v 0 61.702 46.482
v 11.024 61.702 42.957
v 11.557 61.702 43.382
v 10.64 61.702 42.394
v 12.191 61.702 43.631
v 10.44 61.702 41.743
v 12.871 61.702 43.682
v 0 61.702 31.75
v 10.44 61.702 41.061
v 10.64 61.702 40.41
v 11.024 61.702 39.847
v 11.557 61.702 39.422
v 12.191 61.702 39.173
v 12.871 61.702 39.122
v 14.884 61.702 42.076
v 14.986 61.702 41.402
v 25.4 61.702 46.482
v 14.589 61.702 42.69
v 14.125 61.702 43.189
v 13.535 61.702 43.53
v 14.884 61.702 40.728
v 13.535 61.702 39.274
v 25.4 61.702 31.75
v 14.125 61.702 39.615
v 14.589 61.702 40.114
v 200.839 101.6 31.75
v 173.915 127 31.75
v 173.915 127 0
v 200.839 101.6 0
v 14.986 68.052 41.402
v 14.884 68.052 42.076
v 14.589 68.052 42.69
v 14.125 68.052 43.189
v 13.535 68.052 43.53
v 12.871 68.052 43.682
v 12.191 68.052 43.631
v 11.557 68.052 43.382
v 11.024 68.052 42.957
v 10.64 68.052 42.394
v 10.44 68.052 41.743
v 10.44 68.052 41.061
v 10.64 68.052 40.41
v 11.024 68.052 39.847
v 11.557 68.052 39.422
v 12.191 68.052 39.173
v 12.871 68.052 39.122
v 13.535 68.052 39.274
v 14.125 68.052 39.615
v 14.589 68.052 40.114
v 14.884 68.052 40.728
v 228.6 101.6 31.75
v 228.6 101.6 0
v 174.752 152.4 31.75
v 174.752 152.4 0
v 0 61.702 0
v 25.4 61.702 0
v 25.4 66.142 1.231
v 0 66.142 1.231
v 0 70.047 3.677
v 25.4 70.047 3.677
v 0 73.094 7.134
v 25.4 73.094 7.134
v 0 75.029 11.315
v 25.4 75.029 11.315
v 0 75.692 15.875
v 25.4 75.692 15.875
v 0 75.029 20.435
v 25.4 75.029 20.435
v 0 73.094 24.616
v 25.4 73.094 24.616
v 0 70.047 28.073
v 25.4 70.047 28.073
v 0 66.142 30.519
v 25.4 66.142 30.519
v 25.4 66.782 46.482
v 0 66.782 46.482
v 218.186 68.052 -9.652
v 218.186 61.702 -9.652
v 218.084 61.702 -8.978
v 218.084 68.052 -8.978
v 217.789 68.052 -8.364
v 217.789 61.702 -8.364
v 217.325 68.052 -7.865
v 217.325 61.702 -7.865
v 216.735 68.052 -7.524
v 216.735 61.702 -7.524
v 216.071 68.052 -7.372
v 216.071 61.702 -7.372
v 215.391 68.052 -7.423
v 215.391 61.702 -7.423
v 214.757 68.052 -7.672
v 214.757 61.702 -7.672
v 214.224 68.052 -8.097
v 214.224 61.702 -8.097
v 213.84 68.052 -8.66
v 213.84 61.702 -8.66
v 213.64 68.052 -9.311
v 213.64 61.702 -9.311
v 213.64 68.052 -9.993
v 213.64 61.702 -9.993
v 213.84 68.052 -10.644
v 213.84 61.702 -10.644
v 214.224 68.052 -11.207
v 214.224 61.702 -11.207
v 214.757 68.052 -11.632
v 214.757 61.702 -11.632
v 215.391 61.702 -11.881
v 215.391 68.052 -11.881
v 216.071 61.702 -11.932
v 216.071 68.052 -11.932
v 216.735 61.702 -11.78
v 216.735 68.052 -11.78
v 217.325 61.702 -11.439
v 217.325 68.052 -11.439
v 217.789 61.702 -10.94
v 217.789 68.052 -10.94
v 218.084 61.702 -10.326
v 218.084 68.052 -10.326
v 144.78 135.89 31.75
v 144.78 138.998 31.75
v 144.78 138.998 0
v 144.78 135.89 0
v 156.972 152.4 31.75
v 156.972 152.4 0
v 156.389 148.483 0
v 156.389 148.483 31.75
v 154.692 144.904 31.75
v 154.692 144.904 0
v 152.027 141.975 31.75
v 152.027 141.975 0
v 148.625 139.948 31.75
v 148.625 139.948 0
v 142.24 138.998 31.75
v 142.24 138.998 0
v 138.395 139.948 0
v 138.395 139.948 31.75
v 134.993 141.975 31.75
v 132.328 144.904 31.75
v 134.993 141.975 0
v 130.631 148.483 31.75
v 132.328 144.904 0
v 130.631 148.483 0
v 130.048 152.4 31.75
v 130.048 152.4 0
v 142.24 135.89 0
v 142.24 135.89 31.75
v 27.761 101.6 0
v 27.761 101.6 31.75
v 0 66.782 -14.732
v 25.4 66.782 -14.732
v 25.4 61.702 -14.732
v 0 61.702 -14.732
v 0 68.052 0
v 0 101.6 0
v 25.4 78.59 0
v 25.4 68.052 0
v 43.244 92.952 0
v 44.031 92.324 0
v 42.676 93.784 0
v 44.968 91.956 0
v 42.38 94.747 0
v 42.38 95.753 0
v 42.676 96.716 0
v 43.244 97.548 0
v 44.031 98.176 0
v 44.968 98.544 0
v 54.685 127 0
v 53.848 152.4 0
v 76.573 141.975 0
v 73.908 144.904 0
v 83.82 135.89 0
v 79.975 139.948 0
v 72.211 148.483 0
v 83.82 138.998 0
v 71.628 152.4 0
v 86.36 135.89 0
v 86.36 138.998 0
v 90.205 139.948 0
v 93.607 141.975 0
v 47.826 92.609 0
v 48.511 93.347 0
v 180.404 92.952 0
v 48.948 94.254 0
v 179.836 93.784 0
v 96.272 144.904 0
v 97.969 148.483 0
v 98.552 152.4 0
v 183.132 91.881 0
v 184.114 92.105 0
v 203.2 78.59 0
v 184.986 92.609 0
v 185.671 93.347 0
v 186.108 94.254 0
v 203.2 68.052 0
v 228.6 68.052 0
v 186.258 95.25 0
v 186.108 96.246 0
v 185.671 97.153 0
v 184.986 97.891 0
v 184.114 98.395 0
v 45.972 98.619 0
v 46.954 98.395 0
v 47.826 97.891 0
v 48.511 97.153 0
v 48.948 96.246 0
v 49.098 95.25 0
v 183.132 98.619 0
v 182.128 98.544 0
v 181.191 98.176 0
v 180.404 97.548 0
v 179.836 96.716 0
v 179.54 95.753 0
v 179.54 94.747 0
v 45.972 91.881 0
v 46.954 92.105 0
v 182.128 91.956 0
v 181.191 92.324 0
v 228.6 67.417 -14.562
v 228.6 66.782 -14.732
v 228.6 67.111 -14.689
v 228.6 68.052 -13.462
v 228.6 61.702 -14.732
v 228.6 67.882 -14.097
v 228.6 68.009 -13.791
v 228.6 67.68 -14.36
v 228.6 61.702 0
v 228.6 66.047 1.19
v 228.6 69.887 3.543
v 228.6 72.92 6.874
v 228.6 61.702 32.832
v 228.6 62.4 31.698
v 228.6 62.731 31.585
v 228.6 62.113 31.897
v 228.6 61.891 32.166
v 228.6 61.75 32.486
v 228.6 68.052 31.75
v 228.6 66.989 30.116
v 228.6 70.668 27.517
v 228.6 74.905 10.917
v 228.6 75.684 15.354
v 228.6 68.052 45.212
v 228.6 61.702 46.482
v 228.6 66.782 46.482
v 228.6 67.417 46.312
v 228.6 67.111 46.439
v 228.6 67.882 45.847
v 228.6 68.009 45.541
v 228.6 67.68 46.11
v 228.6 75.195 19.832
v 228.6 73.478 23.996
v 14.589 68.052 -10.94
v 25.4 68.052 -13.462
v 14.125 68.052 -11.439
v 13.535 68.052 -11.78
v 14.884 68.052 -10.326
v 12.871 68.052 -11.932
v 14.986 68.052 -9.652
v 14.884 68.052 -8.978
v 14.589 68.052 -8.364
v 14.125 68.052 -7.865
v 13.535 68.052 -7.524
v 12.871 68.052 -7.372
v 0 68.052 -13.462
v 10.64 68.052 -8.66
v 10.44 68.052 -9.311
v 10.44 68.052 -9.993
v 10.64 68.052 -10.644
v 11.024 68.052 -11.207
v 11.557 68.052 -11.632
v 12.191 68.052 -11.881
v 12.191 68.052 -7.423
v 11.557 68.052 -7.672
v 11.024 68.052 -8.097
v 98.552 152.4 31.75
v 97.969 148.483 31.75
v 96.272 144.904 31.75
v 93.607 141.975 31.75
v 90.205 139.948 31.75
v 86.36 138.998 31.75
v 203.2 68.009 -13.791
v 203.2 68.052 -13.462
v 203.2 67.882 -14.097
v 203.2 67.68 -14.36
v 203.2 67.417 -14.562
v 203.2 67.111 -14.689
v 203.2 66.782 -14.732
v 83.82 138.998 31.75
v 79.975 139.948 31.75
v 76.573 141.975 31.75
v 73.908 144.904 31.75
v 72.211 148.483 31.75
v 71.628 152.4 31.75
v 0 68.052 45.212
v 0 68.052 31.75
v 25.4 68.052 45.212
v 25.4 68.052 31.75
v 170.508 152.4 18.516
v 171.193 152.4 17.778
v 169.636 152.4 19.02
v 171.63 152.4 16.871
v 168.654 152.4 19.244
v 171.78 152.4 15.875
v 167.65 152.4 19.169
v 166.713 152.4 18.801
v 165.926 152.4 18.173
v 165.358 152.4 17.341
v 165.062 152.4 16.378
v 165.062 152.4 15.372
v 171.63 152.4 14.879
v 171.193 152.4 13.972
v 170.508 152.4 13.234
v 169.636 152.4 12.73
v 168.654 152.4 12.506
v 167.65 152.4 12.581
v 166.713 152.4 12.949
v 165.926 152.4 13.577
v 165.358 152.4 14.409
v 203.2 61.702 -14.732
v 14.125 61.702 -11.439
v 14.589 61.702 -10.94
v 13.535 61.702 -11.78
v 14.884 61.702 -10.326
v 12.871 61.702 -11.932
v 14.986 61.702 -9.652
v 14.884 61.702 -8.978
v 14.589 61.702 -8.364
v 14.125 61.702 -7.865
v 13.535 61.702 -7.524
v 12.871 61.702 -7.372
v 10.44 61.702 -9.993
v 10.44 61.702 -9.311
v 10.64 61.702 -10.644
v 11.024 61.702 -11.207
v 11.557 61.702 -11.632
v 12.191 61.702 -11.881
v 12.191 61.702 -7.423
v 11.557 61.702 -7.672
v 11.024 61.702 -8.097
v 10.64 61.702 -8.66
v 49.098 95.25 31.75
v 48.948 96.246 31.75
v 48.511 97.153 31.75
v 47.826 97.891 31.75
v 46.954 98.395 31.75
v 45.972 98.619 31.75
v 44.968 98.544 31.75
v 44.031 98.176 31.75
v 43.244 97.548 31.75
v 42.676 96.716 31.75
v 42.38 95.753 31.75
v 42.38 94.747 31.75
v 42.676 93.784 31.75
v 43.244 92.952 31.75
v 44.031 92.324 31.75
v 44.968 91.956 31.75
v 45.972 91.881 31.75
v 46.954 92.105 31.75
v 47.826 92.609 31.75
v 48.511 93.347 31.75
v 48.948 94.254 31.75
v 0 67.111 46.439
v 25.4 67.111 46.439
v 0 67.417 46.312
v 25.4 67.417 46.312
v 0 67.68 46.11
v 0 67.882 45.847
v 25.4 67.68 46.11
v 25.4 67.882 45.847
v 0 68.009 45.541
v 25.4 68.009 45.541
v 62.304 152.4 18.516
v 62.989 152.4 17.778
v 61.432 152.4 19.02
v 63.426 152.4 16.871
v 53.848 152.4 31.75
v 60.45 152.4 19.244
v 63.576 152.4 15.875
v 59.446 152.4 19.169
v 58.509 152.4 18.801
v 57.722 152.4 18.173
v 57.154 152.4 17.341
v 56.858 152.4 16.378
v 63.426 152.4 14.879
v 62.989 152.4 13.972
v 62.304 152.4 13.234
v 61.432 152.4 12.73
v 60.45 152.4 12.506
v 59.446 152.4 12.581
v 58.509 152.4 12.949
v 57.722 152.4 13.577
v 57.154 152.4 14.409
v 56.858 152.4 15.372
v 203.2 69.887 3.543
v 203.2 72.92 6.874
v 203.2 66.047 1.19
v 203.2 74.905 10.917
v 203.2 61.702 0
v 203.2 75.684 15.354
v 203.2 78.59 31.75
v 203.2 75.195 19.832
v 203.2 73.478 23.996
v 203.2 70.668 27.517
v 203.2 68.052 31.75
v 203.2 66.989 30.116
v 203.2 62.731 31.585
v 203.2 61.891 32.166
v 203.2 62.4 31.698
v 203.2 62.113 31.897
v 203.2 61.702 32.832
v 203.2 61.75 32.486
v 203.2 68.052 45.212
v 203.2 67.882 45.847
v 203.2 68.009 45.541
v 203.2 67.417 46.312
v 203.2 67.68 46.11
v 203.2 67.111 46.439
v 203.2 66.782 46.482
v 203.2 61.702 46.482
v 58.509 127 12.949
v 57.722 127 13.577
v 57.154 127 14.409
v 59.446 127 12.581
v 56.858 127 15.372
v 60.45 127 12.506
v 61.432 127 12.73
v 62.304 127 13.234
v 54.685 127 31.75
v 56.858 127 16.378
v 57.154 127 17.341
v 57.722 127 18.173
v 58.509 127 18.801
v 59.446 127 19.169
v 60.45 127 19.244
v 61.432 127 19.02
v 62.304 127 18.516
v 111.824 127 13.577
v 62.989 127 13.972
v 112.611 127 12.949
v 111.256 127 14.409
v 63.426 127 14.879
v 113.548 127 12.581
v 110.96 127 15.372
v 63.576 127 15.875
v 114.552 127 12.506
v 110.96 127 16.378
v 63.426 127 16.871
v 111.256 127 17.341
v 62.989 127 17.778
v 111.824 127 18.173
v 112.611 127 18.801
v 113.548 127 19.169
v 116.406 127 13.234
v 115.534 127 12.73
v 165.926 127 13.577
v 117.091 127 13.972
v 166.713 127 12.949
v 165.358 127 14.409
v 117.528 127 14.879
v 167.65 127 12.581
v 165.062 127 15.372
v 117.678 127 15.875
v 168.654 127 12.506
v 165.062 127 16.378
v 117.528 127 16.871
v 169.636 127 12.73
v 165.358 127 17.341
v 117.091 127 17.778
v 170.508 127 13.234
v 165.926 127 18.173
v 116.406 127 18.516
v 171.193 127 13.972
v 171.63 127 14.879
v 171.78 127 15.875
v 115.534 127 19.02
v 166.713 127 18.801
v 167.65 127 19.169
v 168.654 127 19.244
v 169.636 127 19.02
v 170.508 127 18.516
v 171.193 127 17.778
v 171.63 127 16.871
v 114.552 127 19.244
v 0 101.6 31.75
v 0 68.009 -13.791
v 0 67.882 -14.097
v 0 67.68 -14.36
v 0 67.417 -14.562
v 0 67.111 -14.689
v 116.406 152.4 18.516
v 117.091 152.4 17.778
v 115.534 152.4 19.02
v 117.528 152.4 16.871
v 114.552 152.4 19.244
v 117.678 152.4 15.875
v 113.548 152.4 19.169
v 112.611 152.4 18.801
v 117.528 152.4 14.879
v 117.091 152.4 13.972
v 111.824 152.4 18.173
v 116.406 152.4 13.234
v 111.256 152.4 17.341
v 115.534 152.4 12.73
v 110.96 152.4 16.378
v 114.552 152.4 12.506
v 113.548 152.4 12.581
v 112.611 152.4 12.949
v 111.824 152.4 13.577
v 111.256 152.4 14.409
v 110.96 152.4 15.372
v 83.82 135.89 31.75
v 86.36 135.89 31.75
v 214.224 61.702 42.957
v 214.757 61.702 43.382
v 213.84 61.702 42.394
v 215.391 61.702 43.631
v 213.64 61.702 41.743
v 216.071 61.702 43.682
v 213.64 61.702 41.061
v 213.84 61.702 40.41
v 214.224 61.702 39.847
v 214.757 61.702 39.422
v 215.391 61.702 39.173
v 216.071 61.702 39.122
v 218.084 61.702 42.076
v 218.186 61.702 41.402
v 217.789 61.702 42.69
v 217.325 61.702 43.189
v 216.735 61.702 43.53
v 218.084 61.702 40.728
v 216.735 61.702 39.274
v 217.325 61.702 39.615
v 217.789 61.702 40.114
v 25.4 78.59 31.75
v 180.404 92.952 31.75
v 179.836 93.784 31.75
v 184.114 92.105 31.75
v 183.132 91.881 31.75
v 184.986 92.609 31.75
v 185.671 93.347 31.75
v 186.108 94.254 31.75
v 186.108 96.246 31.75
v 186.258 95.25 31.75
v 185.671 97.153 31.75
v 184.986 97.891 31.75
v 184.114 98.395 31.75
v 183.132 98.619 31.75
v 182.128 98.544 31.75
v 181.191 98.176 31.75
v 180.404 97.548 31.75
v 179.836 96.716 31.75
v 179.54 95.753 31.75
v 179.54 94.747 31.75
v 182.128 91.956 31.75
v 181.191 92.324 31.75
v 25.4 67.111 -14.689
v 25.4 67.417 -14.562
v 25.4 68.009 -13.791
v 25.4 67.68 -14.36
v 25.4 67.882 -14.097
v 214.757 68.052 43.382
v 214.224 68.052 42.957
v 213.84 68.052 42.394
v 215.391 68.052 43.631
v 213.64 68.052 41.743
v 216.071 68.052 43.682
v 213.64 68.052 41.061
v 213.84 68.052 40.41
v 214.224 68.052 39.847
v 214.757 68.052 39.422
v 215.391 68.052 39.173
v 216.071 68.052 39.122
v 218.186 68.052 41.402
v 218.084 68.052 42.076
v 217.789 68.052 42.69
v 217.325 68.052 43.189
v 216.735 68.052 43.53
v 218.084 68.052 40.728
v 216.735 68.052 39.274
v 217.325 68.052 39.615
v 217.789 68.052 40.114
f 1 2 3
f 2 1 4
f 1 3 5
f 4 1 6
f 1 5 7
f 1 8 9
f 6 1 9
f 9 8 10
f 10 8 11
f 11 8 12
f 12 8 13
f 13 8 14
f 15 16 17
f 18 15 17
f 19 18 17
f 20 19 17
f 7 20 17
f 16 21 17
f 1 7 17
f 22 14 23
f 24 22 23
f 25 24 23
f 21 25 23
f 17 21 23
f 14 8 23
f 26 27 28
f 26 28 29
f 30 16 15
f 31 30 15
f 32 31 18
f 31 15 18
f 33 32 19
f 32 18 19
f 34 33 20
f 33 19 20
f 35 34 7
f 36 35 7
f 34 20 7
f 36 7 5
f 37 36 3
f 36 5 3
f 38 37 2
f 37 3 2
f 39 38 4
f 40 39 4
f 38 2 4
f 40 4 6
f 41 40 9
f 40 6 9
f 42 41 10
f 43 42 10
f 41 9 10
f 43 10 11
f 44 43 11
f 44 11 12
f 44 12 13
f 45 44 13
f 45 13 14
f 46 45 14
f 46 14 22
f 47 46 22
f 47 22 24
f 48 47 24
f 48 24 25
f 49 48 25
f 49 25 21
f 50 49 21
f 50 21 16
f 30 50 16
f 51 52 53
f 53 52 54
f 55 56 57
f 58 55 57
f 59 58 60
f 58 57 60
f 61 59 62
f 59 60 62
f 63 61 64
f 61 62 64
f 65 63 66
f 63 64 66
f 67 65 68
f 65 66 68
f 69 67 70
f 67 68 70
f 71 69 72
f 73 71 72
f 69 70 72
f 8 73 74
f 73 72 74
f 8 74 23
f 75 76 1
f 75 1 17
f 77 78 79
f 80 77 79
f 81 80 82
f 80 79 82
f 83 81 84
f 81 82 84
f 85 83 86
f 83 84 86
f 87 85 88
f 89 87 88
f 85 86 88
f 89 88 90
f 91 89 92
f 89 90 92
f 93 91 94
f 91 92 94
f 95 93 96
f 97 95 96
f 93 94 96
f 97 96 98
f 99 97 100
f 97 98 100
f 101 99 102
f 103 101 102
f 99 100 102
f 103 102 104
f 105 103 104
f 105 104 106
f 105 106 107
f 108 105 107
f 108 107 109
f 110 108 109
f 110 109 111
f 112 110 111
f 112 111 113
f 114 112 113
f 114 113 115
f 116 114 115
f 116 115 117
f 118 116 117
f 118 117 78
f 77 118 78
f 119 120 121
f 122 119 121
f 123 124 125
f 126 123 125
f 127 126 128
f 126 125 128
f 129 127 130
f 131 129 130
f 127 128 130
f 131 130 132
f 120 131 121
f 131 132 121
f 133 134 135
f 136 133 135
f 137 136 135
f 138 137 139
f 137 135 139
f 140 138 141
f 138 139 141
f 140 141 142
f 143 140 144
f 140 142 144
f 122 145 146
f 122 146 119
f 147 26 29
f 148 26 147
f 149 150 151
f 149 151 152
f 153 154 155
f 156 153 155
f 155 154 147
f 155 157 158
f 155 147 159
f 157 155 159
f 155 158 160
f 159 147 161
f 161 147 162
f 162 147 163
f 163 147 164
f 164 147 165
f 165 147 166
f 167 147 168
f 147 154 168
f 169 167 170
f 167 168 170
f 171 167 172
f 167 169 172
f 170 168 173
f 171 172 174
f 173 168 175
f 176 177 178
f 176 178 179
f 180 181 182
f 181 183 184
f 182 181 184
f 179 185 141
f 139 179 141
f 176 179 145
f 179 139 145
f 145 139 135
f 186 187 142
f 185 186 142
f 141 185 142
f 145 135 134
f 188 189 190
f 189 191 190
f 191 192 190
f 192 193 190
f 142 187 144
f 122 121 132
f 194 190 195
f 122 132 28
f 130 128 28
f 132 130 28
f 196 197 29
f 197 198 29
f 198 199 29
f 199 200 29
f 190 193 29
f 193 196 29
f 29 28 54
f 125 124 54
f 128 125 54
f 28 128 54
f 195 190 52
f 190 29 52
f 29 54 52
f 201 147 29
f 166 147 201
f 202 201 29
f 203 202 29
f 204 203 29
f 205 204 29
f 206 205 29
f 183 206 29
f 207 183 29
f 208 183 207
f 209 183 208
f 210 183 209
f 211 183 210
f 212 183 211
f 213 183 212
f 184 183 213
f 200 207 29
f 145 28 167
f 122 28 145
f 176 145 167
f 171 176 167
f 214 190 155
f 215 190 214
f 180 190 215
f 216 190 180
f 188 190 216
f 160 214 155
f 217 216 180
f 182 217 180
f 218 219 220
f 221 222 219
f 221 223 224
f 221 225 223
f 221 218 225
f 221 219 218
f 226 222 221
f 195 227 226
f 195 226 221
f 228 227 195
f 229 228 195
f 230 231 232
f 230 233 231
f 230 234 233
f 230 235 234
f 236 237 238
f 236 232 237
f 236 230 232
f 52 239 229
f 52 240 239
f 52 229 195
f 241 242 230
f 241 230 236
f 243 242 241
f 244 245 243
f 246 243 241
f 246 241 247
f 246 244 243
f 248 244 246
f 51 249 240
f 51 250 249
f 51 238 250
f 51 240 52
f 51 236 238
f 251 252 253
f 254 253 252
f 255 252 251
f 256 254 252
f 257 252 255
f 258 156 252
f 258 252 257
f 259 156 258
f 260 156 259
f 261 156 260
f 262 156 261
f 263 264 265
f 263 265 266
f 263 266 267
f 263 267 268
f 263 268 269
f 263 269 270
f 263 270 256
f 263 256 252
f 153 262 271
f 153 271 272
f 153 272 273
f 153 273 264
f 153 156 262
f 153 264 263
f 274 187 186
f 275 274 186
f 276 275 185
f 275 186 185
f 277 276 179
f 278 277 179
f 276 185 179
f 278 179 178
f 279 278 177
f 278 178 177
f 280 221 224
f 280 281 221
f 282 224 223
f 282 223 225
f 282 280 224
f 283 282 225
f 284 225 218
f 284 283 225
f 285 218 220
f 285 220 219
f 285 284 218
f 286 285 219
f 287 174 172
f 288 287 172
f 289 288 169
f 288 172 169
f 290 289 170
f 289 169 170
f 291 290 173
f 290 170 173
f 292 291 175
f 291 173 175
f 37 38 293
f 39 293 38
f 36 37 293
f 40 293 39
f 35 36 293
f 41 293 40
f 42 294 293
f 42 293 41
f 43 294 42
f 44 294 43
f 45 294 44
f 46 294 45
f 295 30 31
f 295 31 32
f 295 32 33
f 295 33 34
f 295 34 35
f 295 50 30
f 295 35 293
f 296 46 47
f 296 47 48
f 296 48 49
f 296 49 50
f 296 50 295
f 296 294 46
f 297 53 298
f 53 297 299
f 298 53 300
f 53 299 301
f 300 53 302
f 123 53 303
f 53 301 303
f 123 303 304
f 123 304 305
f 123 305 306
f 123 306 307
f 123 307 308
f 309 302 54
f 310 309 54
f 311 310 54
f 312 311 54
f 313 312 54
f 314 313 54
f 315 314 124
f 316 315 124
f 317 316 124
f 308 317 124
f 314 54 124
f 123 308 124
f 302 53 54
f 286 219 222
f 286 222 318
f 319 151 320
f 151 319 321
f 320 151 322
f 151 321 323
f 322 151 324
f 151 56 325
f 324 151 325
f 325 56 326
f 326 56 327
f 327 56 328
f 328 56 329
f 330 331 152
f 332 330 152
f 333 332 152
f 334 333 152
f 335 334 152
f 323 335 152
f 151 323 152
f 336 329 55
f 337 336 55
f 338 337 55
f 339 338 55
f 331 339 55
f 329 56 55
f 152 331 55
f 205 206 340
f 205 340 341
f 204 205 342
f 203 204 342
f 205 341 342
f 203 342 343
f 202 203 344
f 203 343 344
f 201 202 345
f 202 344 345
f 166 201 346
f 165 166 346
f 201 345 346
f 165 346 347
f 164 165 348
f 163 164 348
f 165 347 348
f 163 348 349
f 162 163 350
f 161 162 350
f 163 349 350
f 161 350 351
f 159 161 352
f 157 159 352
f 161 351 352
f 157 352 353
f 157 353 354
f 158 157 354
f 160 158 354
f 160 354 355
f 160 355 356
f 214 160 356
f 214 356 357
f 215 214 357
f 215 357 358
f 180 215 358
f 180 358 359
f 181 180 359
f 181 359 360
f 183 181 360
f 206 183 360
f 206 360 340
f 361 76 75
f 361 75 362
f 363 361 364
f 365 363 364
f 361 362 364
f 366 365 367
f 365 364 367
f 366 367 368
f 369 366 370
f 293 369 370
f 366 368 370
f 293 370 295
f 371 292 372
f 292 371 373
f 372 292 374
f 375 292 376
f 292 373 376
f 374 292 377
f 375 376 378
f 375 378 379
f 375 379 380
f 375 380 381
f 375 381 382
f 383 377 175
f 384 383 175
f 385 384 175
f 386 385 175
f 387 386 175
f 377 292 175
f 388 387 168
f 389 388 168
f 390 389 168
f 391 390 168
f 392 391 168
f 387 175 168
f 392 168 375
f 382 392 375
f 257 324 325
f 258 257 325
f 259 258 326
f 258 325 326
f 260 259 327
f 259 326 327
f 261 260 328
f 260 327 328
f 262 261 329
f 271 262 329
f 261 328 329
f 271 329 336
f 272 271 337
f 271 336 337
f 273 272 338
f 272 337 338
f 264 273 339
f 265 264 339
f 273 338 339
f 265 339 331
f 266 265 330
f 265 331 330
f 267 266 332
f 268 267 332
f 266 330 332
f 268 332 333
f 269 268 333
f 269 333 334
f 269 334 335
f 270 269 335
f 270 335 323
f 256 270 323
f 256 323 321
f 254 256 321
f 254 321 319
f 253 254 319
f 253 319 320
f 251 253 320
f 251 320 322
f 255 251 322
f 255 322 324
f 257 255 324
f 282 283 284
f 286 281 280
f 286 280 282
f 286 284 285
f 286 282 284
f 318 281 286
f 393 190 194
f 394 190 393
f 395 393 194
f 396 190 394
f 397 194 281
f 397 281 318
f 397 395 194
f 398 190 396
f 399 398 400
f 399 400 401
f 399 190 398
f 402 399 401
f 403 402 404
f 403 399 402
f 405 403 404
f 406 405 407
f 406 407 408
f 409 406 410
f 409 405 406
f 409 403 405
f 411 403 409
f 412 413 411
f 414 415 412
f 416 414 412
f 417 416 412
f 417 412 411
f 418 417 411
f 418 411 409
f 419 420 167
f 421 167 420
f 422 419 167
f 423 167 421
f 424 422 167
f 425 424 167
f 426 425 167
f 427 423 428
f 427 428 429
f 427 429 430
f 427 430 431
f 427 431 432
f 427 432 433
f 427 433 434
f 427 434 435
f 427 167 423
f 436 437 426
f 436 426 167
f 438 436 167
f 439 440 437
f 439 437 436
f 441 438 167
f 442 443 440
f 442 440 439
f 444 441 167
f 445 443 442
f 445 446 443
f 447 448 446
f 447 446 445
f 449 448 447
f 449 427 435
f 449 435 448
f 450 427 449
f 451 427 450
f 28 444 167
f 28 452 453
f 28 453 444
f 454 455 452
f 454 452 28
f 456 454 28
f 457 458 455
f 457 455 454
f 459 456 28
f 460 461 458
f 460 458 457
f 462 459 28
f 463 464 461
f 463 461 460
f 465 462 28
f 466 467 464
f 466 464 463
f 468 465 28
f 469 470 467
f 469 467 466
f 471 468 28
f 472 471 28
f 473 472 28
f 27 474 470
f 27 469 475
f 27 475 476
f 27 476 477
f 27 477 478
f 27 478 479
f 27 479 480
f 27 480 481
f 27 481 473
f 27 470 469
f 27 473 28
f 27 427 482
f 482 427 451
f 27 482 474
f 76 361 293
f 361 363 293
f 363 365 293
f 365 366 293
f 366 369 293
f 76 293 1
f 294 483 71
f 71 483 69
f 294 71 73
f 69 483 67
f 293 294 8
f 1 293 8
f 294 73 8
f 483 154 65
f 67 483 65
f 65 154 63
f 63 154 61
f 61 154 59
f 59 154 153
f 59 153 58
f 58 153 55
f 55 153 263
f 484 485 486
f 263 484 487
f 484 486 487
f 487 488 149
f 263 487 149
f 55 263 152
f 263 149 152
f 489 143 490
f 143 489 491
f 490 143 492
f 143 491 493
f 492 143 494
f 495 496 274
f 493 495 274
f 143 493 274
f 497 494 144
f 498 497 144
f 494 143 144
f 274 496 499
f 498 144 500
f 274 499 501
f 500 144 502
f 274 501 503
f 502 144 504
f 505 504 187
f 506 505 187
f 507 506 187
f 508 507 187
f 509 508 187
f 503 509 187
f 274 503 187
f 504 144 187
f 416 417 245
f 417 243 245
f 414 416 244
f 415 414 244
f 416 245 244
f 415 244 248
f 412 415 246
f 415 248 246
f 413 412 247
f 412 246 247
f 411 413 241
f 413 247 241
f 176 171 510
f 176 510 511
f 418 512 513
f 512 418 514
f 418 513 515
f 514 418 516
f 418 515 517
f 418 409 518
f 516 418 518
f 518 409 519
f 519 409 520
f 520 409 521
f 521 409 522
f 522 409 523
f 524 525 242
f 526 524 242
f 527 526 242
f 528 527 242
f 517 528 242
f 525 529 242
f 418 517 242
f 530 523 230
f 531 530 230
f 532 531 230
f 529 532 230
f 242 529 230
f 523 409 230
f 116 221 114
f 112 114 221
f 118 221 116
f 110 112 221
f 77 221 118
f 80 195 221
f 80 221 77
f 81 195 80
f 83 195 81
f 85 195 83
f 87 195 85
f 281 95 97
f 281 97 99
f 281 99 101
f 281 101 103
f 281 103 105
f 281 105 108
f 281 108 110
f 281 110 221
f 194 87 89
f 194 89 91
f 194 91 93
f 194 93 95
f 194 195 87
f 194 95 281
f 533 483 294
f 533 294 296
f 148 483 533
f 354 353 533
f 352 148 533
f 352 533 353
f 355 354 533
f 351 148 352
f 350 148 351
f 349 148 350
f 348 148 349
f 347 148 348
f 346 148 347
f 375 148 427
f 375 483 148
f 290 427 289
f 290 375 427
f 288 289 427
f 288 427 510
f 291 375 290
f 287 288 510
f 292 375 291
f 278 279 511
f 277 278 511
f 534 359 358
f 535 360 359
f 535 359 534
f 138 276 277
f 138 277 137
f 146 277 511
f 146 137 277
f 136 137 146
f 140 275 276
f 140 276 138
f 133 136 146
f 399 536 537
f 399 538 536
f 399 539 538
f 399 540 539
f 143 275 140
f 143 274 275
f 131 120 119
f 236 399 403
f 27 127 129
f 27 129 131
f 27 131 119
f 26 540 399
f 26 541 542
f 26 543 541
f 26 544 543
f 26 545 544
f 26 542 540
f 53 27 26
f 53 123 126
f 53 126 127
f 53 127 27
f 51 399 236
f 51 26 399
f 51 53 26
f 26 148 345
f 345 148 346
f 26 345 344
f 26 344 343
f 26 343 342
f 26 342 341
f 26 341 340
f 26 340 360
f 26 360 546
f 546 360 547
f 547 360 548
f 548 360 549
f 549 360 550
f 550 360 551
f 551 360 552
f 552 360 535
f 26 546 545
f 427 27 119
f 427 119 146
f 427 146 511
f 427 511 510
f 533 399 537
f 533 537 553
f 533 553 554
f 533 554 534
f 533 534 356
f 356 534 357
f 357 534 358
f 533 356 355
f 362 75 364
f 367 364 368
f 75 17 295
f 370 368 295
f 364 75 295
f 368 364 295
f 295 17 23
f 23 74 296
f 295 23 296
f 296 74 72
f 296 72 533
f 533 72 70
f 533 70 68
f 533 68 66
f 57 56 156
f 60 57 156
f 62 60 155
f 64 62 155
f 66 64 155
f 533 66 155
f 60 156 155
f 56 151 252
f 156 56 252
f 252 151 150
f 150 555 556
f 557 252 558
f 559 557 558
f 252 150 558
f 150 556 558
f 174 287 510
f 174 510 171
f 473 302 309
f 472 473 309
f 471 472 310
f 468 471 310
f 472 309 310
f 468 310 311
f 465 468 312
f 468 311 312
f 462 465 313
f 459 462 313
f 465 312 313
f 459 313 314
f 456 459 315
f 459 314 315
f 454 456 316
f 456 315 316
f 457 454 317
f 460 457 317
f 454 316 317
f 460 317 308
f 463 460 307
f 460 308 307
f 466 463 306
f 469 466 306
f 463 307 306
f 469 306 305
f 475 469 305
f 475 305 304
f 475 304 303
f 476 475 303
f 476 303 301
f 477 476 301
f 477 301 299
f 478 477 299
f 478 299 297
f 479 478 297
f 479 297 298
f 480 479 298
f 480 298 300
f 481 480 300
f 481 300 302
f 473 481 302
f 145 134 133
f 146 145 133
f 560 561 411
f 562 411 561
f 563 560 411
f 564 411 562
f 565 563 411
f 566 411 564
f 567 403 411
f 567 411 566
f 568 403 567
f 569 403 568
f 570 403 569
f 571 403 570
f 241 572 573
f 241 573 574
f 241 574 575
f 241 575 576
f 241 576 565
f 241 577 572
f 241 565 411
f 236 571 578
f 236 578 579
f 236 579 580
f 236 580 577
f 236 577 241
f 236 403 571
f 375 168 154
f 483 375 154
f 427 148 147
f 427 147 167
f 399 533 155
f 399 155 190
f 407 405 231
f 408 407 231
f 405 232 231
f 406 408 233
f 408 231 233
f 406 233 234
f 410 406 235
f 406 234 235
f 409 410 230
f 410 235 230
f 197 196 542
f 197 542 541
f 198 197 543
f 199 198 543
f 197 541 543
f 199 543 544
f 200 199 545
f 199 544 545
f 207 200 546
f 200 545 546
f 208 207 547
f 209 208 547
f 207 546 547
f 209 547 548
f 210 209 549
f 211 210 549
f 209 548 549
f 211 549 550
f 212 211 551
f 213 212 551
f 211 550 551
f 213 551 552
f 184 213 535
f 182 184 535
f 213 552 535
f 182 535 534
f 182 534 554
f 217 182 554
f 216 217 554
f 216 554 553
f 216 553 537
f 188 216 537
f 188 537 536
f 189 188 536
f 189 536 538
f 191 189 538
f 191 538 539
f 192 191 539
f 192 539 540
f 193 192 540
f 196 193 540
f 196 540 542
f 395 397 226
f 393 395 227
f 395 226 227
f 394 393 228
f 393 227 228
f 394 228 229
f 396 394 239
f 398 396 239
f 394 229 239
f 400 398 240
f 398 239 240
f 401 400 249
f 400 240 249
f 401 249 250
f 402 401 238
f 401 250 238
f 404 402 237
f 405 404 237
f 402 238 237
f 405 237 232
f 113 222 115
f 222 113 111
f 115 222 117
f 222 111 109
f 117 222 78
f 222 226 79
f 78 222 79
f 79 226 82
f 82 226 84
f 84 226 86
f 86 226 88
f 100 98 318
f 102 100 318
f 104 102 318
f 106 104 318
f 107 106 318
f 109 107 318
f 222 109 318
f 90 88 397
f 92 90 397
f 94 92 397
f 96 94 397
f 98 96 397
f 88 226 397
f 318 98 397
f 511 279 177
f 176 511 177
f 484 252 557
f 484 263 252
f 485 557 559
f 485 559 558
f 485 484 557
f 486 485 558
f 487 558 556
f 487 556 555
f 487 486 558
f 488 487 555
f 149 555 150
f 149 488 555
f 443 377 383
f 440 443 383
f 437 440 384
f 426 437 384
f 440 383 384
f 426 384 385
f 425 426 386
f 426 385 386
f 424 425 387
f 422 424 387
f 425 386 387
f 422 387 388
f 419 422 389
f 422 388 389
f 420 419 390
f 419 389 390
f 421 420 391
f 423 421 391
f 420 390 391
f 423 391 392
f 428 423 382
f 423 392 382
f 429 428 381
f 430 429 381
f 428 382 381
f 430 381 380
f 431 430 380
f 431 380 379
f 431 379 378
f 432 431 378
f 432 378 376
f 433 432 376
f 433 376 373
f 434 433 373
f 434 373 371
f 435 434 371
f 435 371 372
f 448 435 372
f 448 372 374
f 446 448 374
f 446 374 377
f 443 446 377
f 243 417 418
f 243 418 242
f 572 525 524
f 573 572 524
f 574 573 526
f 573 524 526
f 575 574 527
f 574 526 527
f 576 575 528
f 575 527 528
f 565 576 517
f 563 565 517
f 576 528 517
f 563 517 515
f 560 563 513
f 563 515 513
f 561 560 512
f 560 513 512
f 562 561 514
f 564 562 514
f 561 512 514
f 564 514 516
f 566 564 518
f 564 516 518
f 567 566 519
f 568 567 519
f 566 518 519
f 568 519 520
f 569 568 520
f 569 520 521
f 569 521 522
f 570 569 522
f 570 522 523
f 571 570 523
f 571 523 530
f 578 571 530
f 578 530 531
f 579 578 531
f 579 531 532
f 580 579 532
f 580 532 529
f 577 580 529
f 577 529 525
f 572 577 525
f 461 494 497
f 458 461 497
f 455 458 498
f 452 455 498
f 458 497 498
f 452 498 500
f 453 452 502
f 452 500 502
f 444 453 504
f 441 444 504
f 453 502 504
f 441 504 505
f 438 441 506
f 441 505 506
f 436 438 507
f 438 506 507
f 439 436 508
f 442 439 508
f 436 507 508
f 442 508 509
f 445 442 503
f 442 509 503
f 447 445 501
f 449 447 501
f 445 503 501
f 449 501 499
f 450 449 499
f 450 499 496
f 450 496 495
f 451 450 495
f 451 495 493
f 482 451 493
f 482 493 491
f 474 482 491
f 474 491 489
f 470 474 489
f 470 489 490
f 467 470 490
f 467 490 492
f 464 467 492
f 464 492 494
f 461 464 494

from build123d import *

# Parameters (mm, degrees)
BOSS_EXTRUDE1_DEPTH = 50.8
SKETCH7_W           = 228.6
SKETCH7_H           = 152.4
CUT_EXTRUDE5_DEPTH  = 19.05
SKETCH9_R           = 3.3782
CUT_EXTRUDE7_DEPTH  = 27.94
CUT_EXTRUDE8_DEPTH  = 40.64
SKETCH12_W          = 1.27
SKETCH12_H          = 31.75
CUT_EXTRUDE9_DEPTH  = 16.51
CUT_EXTRUDE10_REACH = 33.75
SKETCH13_R          = 3.3782
CUT_EXTRUDE11_DEPTH = 32.75
SKETCH15_R          = 16.002
CUT_EXTRUDE12_DEPTH = 229.6
SKETCH16_W          = 25.4
SKETCH16_H          = 6.35
BOSS_EXTRUDE2_DEPTH = 14.732
SKETCH17_W          = 25.4
SKETCH17_H          = 6.35
BOSS_EXTRUDE3_DEPTH = 14.732
FILLET7_R           = 1.27
FILLET8_R           = 1.27
FILLET9_R           = 1.27
FILLET10_R          = 1.27
CUT_EXTRUDE14_DEPTH = 47.482
FILLET15_R          = 1.27
SKETCH22_R          = 2.286
CUT_EXTRUDE15_DEPTH = 91.697941601


with BuildPart() as part:
    # Sketch2 → Boss-Extrude1 (new body)
    with BuildSketch(Plane.XY):
        with BuildLine():
            Line((215.9, 0), (228.6, 0))
            Line((228.6, 0), (228.6, 101.6))
            Line((228.6, 101.6), (174.752, 152.4))
            Line((174.752, 152.4), (156.972, 152.4))
            ThreePointArc((156.972, 152.4), (143.51, 138.938), (130.048, 152.4))
            Line((130.048, 152.4), (98.552, 152.4))
            ThreePointArc((98.552, 152.4), (85.09, 138.938), (71.628, 152.4))
            Line((71.628, 152.4), (53.848, 152.4))
            Line((53.848, 152.4), (0, 101.6))
            Line((0, 101.6), (0, 0))
            Line((0, 0), (12.7, 0))
            Line((12.7, 0), (215.9, 0))
        make_face()
    extrude(amount=BOSS_EXTRUDE1_DEPTH)

    # Sketch7 → Cut-Extrude5 (cut)
    with BuildSketch(Plane.XY.offset(50.8)):
        with Locations((114.3, 76.2)):
            Rectangle(SKETCH7_W, SKETCH7_H)
    extrude(amount=-CUT_EXTRUDE5_DEPTH, mode=Mode.SUBTRACT)

    # Sketch9 → Cut-Extrude7 (cut)
    with BuildSketch(Plane(origin=(0, 152.4, 0), x_dir=(1, 0, 0), z_dir=(0, 1, 0))):
        with Locations((60.198, -15.875)):
            Circle(SKETCH9_R)
        with Locations((114.3, -15.875)):
            Circle(SKETCH9_R)
        with Locations((168.402, -15.875)):
            Circle(SKETCH9_R)
    extrude(amount=-CUT_EXTRUDE7_DEPTH, mode=Mode.SUBTRACT)

    # Sketch10 → Cut-Extrude8 (cut)
    with BuildSketch(Plane.XY.offset(31.75)):
        Polygon((27.760759157, 101.6), (54.684759157, 127), (173.915240843, 127), (200.839240843, 101.6), align=None)
    extrude(amount=-CUT_EXTRUDE8_DEPTH, mode=Mode.SUBTRACT)

    # Sketch12 → Cut-Extrude9 (cut)
    with BuildSketch(Plane(origin=(0, 152.4, 0), x_dir=(1, 0, 0), z_dir=(0, 1, 0))):
        with Locations((85.725, -15.875)):
            Rectangle(SKETCH12_W, SKETCH12_H)
        with Locations((84.455, -15.875)):
            Rectangle(SKETCH12_W, SKETCH12_H)
        Polygon((143.51, 0), (142.24, 0), (142.24, -31.75), (144.78, -31.75), (144.78, 0), align=None)
    extrude(amount=-CUT_EXTRUDE9_DEPTH, mode=Mode.SUBTRACT)

    # Sketch13 → Cut-Extrude10 (cut, up to next)
    with BuildSketch(Plane.XY.offset(31.75), mode=Mode.PRIVATE) as cut_extrude10_sk1:
        with Locations((45.72, 95.25)):
            Circle(SKETCH13_R)
    cut_extrude10_tool1 = extrude(cut_extrude10_sk1.sketch, amount=-CUT_EXTRUDE10_REACH, mode=Mode.PRIVATE) & part.part
    add(cut_extrude10_tool1.solids().sort_by_distance((45.72, 95.25, 31.75))[0], mode=Mode.SUBTRACT)
    # Sketch13 → Cut-Extrude10 (cut, up to next)
    with BuildSketch(Plane.XY.offset(31.75), mode=Mode.PRIVATE) as cut_extrude10_sk2:
        with Locations((182.88, 95.25)):
            Circle(SKETCH13_R)
    cut_extrude10_tool2 = extrude(cut_extrude10_sk2.sketch, amount=-CUT_EXTRUDE10_REACH, mode=Mode.PRIVATE) & part.part
    add(cut_extrude10_tool2.solids().sort_by_distance((182.88, 95.25, 31.75))[0], mode=Mode.SUBTRACT)

    # Sketch14 → Cut-Extrude11 (cut, through all)
    with BuildSketch(Plane(origin=(0, 0, 0), x_dir=(-1, 0, 0), z_dir=(0, 0, -1))):
        Polygon((-182.88, 59.69), (-228.6, 59.69), (-228.6, 0), (0, 0), (0, 59.69), align=None)
    extrude(amount=-CUT_EXTRUDE11_DEPTH, mode=Mode.SUBTRACT)

    # Sketch15 → Cut-Extrude12 (cut, through all)
    with BuildSketch(Plane(origin=(228.6, 0, 0), x_dir=(0, 0, -1), z_dir=(1, 0, 0))):
        with Locations((-15.875, 59.69)):
            Circle(SKETCH15_R)
    extrude(amount=-CUT_EXTRUDE12_DEPTH, mode=Mode.SUBTRACT)

    # Sketch16 → Boss-Extrude2 (add)
    with BuildSketch(Plane.XY.offset(31.75)):
        with Locations((215.9, 64.877058399)):
            Rectangle(SKETCH16_W, SKETCH16_H)
        with Locations((12.7, 64.877058399)):
            Rectangle(SKETCH16_W, SKETCH16_H)
    extrude(amount=BOSS_EXTRUDE2_DEPTH)

    # Sketch17 → Boss-Extrude3 (add)
    with BuildSketch(Plane(origin=(0, 0, 0), x_dir=(-1, 0, 0), z_dir=(0, 0, -1))):
        with Locations((-215.9, 64.877058399)):
            Rectangle(SKETCH17_W, SKETCH17_H)
        with Locations((-12.7, 64.877058399)):
            Rectangle(SKETCH17_W, SKETCH17_H)
    extrude(amount=BOSS_EXTRUDE3_DEPTH)

    # Fillet7
    fillet7_edges = [part.edges().sort_by_distance(p)[0] for p in [
        (215.9, 68.052058399, 46.482),
    ]]
    fillet(fillet7_edges, radius=FILLET7_R)

    # Fillet8
    fillet8_edges = [part.edges().sort_by_distance(p)[0] for p in [
        (215.9, 68.052058399, -14.732),
    ]]
    fillet(fillet8_edges, radius=FILLET8_R)

    # Fillet9
    fillet9_edges = [part.edges().sort_by_distance(p)[0] for p in [
        (12.7, 68.052058399, -14.732),
    ]]
    fillet(fillet9_edges, radius=FILLET9_R)

    # Fillet10
    fillet10_edges = [part.edges().sort_by_distance(p)[0] for p in [
        (12.7, 68.052058399, 46.482),
    ]]
    fillet(fillet10_edges, radius=FILLET10_R)

    # Sketch20 → Cut-Extrude14 (cut, through all)
    with BuildSketch(Plane.XY.offset(31.75)):
        Polygon((66.04, 61.702058399), (25.4, 61.702058399), (25.4, 78.590265292), (203.2, 78.590265292), (203.2, 61.702058399), (162.56, 61.702058399), align=None)
    extrude(amount=-CUT_EXTRUDE14_DEPTH, mode=Mode.SUBTRACT)

    # Fillet15
    fillet15_edges = [part.edges().sort_by_distance(p)[0] for p in [
        (215.9, 61.702058399, 31.75),
    ]]
    fillet(fillet15_edges, radius=FILLET15_R)

    # Sketch22 → Cut-Extrude15 (cut, through all)
    with BuildSketch(Plane.XZ.offset(-61.702058399)):
        with Locations((12.7, 41.402)):
            Circle(SKETCH22_R)
        with Locations((12.7, -9.652)):
            Circle(SKETCH22_R)
        with Locations((215.9, -9.652)):
            Circle(SKETCH22_R)
        with Locations((215.9, 41.402)):
            Circle(SKETCH22_R)
    extrude(amount=-CUT_EXTRUDE15_DEPTH, mode=Mode.SUBTRACT)


solid = part.part
